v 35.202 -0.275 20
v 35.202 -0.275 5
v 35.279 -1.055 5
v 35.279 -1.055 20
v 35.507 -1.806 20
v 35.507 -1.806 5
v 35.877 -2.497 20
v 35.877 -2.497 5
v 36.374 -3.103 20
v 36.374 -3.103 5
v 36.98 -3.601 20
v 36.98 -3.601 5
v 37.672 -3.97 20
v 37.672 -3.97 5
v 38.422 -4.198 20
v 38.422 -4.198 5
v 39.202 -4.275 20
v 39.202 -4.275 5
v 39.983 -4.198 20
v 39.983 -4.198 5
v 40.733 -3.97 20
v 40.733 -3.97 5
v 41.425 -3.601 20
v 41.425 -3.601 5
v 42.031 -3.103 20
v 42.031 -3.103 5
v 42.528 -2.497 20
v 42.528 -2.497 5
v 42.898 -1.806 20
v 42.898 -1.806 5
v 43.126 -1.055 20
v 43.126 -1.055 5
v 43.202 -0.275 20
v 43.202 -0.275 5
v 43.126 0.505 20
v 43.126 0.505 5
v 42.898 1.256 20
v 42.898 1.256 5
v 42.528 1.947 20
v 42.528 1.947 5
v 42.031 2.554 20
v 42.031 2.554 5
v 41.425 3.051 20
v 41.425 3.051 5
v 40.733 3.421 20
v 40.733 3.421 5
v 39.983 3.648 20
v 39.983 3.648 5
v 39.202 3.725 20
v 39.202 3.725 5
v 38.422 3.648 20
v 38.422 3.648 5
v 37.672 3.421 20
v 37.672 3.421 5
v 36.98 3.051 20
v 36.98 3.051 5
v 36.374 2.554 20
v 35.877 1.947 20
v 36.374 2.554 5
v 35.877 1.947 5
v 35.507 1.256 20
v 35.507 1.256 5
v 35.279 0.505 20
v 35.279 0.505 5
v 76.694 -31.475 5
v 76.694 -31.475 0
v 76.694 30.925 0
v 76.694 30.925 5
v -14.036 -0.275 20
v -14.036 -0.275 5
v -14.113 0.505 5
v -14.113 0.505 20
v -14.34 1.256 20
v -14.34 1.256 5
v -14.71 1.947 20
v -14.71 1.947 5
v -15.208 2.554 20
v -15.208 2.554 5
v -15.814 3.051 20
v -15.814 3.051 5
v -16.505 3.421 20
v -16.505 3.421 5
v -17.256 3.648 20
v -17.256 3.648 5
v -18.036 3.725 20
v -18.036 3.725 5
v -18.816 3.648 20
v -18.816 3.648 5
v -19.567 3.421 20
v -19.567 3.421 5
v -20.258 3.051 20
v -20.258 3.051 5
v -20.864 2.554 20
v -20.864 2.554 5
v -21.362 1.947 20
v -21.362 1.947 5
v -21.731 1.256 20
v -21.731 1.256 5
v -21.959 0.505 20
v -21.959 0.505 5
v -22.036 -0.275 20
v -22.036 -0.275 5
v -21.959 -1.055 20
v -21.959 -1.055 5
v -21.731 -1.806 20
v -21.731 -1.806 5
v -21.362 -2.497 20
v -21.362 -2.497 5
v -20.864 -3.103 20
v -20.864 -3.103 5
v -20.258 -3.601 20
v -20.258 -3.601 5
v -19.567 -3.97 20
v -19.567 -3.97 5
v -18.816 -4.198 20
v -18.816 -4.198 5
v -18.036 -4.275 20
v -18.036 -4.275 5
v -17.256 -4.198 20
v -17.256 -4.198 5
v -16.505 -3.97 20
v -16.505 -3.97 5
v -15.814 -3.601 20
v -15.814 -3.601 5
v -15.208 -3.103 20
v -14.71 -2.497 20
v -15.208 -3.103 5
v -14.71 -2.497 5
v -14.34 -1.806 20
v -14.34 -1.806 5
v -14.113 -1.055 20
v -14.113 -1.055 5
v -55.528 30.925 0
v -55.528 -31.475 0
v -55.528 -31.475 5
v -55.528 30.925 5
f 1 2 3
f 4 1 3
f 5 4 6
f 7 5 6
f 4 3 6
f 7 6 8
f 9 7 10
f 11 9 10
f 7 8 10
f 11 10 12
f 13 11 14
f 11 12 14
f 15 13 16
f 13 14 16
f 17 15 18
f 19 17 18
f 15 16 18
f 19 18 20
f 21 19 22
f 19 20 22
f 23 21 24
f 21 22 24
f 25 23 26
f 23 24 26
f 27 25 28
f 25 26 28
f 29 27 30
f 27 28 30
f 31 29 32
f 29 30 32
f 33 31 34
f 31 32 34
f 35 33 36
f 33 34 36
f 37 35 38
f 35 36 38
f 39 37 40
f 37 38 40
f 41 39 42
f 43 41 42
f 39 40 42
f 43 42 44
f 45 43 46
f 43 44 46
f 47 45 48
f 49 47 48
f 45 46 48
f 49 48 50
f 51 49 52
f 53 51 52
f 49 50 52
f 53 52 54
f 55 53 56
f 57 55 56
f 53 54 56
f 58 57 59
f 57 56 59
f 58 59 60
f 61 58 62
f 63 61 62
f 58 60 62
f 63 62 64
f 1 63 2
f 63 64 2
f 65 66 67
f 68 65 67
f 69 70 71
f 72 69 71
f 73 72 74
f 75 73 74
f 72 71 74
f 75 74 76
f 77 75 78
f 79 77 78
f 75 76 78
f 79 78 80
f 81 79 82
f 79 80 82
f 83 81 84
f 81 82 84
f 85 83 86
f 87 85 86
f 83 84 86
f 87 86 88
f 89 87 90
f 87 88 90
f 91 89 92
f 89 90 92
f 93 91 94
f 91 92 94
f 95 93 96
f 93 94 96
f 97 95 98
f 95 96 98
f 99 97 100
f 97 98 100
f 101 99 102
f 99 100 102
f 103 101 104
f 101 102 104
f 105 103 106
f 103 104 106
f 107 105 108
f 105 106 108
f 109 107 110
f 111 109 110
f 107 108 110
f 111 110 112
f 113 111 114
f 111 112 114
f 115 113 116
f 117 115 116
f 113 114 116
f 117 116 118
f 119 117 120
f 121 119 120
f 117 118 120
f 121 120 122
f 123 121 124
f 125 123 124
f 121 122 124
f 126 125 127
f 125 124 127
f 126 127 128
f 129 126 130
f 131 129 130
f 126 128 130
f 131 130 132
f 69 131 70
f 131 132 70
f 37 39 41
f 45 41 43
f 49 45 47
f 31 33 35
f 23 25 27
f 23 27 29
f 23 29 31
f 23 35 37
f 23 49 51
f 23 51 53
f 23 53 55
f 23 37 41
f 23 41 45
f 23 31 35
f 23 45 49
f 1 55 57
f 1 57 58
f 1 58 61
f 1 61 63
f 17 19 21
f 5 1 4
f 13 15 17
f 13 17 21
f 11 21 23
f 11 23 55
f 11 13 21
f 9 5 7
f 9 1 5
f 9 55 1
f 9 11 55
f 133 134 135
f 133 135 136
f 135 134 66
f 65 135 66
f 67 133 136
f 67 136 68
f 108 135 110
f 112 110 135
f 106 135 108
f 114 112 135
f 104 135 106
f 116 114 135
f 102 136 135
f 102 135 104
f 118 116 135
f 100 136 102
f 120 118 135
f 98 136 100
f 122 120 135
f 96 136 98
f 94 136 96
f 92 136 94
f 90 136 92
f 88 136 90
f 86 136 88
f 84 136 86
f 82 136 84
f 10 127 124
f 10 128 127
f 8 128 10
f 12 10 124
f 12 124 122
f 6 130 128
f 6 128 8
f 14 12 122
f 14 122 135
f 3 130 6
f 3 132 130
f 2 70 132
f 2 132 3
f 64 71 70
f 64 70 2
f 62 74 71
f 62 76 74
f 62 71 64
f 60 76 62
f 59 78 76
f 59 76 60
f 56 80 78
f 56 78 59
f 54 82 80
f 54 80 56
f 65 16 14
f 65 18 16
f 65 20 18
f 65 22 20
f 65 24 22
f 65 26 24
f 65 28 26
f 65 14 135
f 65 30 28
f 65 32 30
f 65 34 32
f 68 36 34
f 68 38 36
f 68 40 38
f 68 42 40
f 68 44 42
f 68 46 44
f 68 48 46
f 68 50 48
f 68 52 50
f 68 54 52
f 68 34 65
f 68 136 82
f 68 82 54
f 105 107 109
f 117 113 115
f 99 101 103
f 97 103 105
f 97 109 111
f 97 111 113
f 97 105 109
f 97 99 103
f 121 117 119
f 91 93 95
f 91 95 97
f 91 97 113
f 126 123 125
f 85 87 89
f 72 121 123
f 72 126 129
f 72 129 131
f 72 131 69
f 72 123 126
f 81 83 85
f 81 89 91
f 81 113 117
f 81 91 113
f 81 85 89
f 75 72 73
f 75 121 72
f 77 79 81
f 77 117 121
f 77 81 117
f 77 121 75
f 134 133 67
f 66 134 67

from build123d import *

# Parameters (mm, degrees)
SKETCH1_W           = 132.221839449
SKETCH1_H           = 62.399911756
BOSS_EXTRUDE1_DEPTH = 5
SKETCH2_R           = 4
BOSS_EXTRUDE2_DEPTH = 15


with BuildPart() as part:
    # Sketch1 → Boss-Extrude1 (new body)
    with BuildSketch(Plane.XY):
        with Locations((10.583244946, -0.274889479)):
            Rectangle(SKETCH1_W, SKETCH1_H)
    extrude(amount=BOSS_EXTRUDE1_DEPTH)

    # Sketch2 → Boss-Extrude2 (add)
    with BuildSketch(Plane.XY.offset(5)):
        with Locations((-18.035961804, -0.274889479)):
            Circle(SKETCH2_R)
        with Locations(Location((39.202451695, -0.274889479, 0), (0, 0, 180))):
            Circle(SKETCH2_R)
    extrude(amount=BOSS_EXTRUDE2_DEPTH)


solid = part.part
